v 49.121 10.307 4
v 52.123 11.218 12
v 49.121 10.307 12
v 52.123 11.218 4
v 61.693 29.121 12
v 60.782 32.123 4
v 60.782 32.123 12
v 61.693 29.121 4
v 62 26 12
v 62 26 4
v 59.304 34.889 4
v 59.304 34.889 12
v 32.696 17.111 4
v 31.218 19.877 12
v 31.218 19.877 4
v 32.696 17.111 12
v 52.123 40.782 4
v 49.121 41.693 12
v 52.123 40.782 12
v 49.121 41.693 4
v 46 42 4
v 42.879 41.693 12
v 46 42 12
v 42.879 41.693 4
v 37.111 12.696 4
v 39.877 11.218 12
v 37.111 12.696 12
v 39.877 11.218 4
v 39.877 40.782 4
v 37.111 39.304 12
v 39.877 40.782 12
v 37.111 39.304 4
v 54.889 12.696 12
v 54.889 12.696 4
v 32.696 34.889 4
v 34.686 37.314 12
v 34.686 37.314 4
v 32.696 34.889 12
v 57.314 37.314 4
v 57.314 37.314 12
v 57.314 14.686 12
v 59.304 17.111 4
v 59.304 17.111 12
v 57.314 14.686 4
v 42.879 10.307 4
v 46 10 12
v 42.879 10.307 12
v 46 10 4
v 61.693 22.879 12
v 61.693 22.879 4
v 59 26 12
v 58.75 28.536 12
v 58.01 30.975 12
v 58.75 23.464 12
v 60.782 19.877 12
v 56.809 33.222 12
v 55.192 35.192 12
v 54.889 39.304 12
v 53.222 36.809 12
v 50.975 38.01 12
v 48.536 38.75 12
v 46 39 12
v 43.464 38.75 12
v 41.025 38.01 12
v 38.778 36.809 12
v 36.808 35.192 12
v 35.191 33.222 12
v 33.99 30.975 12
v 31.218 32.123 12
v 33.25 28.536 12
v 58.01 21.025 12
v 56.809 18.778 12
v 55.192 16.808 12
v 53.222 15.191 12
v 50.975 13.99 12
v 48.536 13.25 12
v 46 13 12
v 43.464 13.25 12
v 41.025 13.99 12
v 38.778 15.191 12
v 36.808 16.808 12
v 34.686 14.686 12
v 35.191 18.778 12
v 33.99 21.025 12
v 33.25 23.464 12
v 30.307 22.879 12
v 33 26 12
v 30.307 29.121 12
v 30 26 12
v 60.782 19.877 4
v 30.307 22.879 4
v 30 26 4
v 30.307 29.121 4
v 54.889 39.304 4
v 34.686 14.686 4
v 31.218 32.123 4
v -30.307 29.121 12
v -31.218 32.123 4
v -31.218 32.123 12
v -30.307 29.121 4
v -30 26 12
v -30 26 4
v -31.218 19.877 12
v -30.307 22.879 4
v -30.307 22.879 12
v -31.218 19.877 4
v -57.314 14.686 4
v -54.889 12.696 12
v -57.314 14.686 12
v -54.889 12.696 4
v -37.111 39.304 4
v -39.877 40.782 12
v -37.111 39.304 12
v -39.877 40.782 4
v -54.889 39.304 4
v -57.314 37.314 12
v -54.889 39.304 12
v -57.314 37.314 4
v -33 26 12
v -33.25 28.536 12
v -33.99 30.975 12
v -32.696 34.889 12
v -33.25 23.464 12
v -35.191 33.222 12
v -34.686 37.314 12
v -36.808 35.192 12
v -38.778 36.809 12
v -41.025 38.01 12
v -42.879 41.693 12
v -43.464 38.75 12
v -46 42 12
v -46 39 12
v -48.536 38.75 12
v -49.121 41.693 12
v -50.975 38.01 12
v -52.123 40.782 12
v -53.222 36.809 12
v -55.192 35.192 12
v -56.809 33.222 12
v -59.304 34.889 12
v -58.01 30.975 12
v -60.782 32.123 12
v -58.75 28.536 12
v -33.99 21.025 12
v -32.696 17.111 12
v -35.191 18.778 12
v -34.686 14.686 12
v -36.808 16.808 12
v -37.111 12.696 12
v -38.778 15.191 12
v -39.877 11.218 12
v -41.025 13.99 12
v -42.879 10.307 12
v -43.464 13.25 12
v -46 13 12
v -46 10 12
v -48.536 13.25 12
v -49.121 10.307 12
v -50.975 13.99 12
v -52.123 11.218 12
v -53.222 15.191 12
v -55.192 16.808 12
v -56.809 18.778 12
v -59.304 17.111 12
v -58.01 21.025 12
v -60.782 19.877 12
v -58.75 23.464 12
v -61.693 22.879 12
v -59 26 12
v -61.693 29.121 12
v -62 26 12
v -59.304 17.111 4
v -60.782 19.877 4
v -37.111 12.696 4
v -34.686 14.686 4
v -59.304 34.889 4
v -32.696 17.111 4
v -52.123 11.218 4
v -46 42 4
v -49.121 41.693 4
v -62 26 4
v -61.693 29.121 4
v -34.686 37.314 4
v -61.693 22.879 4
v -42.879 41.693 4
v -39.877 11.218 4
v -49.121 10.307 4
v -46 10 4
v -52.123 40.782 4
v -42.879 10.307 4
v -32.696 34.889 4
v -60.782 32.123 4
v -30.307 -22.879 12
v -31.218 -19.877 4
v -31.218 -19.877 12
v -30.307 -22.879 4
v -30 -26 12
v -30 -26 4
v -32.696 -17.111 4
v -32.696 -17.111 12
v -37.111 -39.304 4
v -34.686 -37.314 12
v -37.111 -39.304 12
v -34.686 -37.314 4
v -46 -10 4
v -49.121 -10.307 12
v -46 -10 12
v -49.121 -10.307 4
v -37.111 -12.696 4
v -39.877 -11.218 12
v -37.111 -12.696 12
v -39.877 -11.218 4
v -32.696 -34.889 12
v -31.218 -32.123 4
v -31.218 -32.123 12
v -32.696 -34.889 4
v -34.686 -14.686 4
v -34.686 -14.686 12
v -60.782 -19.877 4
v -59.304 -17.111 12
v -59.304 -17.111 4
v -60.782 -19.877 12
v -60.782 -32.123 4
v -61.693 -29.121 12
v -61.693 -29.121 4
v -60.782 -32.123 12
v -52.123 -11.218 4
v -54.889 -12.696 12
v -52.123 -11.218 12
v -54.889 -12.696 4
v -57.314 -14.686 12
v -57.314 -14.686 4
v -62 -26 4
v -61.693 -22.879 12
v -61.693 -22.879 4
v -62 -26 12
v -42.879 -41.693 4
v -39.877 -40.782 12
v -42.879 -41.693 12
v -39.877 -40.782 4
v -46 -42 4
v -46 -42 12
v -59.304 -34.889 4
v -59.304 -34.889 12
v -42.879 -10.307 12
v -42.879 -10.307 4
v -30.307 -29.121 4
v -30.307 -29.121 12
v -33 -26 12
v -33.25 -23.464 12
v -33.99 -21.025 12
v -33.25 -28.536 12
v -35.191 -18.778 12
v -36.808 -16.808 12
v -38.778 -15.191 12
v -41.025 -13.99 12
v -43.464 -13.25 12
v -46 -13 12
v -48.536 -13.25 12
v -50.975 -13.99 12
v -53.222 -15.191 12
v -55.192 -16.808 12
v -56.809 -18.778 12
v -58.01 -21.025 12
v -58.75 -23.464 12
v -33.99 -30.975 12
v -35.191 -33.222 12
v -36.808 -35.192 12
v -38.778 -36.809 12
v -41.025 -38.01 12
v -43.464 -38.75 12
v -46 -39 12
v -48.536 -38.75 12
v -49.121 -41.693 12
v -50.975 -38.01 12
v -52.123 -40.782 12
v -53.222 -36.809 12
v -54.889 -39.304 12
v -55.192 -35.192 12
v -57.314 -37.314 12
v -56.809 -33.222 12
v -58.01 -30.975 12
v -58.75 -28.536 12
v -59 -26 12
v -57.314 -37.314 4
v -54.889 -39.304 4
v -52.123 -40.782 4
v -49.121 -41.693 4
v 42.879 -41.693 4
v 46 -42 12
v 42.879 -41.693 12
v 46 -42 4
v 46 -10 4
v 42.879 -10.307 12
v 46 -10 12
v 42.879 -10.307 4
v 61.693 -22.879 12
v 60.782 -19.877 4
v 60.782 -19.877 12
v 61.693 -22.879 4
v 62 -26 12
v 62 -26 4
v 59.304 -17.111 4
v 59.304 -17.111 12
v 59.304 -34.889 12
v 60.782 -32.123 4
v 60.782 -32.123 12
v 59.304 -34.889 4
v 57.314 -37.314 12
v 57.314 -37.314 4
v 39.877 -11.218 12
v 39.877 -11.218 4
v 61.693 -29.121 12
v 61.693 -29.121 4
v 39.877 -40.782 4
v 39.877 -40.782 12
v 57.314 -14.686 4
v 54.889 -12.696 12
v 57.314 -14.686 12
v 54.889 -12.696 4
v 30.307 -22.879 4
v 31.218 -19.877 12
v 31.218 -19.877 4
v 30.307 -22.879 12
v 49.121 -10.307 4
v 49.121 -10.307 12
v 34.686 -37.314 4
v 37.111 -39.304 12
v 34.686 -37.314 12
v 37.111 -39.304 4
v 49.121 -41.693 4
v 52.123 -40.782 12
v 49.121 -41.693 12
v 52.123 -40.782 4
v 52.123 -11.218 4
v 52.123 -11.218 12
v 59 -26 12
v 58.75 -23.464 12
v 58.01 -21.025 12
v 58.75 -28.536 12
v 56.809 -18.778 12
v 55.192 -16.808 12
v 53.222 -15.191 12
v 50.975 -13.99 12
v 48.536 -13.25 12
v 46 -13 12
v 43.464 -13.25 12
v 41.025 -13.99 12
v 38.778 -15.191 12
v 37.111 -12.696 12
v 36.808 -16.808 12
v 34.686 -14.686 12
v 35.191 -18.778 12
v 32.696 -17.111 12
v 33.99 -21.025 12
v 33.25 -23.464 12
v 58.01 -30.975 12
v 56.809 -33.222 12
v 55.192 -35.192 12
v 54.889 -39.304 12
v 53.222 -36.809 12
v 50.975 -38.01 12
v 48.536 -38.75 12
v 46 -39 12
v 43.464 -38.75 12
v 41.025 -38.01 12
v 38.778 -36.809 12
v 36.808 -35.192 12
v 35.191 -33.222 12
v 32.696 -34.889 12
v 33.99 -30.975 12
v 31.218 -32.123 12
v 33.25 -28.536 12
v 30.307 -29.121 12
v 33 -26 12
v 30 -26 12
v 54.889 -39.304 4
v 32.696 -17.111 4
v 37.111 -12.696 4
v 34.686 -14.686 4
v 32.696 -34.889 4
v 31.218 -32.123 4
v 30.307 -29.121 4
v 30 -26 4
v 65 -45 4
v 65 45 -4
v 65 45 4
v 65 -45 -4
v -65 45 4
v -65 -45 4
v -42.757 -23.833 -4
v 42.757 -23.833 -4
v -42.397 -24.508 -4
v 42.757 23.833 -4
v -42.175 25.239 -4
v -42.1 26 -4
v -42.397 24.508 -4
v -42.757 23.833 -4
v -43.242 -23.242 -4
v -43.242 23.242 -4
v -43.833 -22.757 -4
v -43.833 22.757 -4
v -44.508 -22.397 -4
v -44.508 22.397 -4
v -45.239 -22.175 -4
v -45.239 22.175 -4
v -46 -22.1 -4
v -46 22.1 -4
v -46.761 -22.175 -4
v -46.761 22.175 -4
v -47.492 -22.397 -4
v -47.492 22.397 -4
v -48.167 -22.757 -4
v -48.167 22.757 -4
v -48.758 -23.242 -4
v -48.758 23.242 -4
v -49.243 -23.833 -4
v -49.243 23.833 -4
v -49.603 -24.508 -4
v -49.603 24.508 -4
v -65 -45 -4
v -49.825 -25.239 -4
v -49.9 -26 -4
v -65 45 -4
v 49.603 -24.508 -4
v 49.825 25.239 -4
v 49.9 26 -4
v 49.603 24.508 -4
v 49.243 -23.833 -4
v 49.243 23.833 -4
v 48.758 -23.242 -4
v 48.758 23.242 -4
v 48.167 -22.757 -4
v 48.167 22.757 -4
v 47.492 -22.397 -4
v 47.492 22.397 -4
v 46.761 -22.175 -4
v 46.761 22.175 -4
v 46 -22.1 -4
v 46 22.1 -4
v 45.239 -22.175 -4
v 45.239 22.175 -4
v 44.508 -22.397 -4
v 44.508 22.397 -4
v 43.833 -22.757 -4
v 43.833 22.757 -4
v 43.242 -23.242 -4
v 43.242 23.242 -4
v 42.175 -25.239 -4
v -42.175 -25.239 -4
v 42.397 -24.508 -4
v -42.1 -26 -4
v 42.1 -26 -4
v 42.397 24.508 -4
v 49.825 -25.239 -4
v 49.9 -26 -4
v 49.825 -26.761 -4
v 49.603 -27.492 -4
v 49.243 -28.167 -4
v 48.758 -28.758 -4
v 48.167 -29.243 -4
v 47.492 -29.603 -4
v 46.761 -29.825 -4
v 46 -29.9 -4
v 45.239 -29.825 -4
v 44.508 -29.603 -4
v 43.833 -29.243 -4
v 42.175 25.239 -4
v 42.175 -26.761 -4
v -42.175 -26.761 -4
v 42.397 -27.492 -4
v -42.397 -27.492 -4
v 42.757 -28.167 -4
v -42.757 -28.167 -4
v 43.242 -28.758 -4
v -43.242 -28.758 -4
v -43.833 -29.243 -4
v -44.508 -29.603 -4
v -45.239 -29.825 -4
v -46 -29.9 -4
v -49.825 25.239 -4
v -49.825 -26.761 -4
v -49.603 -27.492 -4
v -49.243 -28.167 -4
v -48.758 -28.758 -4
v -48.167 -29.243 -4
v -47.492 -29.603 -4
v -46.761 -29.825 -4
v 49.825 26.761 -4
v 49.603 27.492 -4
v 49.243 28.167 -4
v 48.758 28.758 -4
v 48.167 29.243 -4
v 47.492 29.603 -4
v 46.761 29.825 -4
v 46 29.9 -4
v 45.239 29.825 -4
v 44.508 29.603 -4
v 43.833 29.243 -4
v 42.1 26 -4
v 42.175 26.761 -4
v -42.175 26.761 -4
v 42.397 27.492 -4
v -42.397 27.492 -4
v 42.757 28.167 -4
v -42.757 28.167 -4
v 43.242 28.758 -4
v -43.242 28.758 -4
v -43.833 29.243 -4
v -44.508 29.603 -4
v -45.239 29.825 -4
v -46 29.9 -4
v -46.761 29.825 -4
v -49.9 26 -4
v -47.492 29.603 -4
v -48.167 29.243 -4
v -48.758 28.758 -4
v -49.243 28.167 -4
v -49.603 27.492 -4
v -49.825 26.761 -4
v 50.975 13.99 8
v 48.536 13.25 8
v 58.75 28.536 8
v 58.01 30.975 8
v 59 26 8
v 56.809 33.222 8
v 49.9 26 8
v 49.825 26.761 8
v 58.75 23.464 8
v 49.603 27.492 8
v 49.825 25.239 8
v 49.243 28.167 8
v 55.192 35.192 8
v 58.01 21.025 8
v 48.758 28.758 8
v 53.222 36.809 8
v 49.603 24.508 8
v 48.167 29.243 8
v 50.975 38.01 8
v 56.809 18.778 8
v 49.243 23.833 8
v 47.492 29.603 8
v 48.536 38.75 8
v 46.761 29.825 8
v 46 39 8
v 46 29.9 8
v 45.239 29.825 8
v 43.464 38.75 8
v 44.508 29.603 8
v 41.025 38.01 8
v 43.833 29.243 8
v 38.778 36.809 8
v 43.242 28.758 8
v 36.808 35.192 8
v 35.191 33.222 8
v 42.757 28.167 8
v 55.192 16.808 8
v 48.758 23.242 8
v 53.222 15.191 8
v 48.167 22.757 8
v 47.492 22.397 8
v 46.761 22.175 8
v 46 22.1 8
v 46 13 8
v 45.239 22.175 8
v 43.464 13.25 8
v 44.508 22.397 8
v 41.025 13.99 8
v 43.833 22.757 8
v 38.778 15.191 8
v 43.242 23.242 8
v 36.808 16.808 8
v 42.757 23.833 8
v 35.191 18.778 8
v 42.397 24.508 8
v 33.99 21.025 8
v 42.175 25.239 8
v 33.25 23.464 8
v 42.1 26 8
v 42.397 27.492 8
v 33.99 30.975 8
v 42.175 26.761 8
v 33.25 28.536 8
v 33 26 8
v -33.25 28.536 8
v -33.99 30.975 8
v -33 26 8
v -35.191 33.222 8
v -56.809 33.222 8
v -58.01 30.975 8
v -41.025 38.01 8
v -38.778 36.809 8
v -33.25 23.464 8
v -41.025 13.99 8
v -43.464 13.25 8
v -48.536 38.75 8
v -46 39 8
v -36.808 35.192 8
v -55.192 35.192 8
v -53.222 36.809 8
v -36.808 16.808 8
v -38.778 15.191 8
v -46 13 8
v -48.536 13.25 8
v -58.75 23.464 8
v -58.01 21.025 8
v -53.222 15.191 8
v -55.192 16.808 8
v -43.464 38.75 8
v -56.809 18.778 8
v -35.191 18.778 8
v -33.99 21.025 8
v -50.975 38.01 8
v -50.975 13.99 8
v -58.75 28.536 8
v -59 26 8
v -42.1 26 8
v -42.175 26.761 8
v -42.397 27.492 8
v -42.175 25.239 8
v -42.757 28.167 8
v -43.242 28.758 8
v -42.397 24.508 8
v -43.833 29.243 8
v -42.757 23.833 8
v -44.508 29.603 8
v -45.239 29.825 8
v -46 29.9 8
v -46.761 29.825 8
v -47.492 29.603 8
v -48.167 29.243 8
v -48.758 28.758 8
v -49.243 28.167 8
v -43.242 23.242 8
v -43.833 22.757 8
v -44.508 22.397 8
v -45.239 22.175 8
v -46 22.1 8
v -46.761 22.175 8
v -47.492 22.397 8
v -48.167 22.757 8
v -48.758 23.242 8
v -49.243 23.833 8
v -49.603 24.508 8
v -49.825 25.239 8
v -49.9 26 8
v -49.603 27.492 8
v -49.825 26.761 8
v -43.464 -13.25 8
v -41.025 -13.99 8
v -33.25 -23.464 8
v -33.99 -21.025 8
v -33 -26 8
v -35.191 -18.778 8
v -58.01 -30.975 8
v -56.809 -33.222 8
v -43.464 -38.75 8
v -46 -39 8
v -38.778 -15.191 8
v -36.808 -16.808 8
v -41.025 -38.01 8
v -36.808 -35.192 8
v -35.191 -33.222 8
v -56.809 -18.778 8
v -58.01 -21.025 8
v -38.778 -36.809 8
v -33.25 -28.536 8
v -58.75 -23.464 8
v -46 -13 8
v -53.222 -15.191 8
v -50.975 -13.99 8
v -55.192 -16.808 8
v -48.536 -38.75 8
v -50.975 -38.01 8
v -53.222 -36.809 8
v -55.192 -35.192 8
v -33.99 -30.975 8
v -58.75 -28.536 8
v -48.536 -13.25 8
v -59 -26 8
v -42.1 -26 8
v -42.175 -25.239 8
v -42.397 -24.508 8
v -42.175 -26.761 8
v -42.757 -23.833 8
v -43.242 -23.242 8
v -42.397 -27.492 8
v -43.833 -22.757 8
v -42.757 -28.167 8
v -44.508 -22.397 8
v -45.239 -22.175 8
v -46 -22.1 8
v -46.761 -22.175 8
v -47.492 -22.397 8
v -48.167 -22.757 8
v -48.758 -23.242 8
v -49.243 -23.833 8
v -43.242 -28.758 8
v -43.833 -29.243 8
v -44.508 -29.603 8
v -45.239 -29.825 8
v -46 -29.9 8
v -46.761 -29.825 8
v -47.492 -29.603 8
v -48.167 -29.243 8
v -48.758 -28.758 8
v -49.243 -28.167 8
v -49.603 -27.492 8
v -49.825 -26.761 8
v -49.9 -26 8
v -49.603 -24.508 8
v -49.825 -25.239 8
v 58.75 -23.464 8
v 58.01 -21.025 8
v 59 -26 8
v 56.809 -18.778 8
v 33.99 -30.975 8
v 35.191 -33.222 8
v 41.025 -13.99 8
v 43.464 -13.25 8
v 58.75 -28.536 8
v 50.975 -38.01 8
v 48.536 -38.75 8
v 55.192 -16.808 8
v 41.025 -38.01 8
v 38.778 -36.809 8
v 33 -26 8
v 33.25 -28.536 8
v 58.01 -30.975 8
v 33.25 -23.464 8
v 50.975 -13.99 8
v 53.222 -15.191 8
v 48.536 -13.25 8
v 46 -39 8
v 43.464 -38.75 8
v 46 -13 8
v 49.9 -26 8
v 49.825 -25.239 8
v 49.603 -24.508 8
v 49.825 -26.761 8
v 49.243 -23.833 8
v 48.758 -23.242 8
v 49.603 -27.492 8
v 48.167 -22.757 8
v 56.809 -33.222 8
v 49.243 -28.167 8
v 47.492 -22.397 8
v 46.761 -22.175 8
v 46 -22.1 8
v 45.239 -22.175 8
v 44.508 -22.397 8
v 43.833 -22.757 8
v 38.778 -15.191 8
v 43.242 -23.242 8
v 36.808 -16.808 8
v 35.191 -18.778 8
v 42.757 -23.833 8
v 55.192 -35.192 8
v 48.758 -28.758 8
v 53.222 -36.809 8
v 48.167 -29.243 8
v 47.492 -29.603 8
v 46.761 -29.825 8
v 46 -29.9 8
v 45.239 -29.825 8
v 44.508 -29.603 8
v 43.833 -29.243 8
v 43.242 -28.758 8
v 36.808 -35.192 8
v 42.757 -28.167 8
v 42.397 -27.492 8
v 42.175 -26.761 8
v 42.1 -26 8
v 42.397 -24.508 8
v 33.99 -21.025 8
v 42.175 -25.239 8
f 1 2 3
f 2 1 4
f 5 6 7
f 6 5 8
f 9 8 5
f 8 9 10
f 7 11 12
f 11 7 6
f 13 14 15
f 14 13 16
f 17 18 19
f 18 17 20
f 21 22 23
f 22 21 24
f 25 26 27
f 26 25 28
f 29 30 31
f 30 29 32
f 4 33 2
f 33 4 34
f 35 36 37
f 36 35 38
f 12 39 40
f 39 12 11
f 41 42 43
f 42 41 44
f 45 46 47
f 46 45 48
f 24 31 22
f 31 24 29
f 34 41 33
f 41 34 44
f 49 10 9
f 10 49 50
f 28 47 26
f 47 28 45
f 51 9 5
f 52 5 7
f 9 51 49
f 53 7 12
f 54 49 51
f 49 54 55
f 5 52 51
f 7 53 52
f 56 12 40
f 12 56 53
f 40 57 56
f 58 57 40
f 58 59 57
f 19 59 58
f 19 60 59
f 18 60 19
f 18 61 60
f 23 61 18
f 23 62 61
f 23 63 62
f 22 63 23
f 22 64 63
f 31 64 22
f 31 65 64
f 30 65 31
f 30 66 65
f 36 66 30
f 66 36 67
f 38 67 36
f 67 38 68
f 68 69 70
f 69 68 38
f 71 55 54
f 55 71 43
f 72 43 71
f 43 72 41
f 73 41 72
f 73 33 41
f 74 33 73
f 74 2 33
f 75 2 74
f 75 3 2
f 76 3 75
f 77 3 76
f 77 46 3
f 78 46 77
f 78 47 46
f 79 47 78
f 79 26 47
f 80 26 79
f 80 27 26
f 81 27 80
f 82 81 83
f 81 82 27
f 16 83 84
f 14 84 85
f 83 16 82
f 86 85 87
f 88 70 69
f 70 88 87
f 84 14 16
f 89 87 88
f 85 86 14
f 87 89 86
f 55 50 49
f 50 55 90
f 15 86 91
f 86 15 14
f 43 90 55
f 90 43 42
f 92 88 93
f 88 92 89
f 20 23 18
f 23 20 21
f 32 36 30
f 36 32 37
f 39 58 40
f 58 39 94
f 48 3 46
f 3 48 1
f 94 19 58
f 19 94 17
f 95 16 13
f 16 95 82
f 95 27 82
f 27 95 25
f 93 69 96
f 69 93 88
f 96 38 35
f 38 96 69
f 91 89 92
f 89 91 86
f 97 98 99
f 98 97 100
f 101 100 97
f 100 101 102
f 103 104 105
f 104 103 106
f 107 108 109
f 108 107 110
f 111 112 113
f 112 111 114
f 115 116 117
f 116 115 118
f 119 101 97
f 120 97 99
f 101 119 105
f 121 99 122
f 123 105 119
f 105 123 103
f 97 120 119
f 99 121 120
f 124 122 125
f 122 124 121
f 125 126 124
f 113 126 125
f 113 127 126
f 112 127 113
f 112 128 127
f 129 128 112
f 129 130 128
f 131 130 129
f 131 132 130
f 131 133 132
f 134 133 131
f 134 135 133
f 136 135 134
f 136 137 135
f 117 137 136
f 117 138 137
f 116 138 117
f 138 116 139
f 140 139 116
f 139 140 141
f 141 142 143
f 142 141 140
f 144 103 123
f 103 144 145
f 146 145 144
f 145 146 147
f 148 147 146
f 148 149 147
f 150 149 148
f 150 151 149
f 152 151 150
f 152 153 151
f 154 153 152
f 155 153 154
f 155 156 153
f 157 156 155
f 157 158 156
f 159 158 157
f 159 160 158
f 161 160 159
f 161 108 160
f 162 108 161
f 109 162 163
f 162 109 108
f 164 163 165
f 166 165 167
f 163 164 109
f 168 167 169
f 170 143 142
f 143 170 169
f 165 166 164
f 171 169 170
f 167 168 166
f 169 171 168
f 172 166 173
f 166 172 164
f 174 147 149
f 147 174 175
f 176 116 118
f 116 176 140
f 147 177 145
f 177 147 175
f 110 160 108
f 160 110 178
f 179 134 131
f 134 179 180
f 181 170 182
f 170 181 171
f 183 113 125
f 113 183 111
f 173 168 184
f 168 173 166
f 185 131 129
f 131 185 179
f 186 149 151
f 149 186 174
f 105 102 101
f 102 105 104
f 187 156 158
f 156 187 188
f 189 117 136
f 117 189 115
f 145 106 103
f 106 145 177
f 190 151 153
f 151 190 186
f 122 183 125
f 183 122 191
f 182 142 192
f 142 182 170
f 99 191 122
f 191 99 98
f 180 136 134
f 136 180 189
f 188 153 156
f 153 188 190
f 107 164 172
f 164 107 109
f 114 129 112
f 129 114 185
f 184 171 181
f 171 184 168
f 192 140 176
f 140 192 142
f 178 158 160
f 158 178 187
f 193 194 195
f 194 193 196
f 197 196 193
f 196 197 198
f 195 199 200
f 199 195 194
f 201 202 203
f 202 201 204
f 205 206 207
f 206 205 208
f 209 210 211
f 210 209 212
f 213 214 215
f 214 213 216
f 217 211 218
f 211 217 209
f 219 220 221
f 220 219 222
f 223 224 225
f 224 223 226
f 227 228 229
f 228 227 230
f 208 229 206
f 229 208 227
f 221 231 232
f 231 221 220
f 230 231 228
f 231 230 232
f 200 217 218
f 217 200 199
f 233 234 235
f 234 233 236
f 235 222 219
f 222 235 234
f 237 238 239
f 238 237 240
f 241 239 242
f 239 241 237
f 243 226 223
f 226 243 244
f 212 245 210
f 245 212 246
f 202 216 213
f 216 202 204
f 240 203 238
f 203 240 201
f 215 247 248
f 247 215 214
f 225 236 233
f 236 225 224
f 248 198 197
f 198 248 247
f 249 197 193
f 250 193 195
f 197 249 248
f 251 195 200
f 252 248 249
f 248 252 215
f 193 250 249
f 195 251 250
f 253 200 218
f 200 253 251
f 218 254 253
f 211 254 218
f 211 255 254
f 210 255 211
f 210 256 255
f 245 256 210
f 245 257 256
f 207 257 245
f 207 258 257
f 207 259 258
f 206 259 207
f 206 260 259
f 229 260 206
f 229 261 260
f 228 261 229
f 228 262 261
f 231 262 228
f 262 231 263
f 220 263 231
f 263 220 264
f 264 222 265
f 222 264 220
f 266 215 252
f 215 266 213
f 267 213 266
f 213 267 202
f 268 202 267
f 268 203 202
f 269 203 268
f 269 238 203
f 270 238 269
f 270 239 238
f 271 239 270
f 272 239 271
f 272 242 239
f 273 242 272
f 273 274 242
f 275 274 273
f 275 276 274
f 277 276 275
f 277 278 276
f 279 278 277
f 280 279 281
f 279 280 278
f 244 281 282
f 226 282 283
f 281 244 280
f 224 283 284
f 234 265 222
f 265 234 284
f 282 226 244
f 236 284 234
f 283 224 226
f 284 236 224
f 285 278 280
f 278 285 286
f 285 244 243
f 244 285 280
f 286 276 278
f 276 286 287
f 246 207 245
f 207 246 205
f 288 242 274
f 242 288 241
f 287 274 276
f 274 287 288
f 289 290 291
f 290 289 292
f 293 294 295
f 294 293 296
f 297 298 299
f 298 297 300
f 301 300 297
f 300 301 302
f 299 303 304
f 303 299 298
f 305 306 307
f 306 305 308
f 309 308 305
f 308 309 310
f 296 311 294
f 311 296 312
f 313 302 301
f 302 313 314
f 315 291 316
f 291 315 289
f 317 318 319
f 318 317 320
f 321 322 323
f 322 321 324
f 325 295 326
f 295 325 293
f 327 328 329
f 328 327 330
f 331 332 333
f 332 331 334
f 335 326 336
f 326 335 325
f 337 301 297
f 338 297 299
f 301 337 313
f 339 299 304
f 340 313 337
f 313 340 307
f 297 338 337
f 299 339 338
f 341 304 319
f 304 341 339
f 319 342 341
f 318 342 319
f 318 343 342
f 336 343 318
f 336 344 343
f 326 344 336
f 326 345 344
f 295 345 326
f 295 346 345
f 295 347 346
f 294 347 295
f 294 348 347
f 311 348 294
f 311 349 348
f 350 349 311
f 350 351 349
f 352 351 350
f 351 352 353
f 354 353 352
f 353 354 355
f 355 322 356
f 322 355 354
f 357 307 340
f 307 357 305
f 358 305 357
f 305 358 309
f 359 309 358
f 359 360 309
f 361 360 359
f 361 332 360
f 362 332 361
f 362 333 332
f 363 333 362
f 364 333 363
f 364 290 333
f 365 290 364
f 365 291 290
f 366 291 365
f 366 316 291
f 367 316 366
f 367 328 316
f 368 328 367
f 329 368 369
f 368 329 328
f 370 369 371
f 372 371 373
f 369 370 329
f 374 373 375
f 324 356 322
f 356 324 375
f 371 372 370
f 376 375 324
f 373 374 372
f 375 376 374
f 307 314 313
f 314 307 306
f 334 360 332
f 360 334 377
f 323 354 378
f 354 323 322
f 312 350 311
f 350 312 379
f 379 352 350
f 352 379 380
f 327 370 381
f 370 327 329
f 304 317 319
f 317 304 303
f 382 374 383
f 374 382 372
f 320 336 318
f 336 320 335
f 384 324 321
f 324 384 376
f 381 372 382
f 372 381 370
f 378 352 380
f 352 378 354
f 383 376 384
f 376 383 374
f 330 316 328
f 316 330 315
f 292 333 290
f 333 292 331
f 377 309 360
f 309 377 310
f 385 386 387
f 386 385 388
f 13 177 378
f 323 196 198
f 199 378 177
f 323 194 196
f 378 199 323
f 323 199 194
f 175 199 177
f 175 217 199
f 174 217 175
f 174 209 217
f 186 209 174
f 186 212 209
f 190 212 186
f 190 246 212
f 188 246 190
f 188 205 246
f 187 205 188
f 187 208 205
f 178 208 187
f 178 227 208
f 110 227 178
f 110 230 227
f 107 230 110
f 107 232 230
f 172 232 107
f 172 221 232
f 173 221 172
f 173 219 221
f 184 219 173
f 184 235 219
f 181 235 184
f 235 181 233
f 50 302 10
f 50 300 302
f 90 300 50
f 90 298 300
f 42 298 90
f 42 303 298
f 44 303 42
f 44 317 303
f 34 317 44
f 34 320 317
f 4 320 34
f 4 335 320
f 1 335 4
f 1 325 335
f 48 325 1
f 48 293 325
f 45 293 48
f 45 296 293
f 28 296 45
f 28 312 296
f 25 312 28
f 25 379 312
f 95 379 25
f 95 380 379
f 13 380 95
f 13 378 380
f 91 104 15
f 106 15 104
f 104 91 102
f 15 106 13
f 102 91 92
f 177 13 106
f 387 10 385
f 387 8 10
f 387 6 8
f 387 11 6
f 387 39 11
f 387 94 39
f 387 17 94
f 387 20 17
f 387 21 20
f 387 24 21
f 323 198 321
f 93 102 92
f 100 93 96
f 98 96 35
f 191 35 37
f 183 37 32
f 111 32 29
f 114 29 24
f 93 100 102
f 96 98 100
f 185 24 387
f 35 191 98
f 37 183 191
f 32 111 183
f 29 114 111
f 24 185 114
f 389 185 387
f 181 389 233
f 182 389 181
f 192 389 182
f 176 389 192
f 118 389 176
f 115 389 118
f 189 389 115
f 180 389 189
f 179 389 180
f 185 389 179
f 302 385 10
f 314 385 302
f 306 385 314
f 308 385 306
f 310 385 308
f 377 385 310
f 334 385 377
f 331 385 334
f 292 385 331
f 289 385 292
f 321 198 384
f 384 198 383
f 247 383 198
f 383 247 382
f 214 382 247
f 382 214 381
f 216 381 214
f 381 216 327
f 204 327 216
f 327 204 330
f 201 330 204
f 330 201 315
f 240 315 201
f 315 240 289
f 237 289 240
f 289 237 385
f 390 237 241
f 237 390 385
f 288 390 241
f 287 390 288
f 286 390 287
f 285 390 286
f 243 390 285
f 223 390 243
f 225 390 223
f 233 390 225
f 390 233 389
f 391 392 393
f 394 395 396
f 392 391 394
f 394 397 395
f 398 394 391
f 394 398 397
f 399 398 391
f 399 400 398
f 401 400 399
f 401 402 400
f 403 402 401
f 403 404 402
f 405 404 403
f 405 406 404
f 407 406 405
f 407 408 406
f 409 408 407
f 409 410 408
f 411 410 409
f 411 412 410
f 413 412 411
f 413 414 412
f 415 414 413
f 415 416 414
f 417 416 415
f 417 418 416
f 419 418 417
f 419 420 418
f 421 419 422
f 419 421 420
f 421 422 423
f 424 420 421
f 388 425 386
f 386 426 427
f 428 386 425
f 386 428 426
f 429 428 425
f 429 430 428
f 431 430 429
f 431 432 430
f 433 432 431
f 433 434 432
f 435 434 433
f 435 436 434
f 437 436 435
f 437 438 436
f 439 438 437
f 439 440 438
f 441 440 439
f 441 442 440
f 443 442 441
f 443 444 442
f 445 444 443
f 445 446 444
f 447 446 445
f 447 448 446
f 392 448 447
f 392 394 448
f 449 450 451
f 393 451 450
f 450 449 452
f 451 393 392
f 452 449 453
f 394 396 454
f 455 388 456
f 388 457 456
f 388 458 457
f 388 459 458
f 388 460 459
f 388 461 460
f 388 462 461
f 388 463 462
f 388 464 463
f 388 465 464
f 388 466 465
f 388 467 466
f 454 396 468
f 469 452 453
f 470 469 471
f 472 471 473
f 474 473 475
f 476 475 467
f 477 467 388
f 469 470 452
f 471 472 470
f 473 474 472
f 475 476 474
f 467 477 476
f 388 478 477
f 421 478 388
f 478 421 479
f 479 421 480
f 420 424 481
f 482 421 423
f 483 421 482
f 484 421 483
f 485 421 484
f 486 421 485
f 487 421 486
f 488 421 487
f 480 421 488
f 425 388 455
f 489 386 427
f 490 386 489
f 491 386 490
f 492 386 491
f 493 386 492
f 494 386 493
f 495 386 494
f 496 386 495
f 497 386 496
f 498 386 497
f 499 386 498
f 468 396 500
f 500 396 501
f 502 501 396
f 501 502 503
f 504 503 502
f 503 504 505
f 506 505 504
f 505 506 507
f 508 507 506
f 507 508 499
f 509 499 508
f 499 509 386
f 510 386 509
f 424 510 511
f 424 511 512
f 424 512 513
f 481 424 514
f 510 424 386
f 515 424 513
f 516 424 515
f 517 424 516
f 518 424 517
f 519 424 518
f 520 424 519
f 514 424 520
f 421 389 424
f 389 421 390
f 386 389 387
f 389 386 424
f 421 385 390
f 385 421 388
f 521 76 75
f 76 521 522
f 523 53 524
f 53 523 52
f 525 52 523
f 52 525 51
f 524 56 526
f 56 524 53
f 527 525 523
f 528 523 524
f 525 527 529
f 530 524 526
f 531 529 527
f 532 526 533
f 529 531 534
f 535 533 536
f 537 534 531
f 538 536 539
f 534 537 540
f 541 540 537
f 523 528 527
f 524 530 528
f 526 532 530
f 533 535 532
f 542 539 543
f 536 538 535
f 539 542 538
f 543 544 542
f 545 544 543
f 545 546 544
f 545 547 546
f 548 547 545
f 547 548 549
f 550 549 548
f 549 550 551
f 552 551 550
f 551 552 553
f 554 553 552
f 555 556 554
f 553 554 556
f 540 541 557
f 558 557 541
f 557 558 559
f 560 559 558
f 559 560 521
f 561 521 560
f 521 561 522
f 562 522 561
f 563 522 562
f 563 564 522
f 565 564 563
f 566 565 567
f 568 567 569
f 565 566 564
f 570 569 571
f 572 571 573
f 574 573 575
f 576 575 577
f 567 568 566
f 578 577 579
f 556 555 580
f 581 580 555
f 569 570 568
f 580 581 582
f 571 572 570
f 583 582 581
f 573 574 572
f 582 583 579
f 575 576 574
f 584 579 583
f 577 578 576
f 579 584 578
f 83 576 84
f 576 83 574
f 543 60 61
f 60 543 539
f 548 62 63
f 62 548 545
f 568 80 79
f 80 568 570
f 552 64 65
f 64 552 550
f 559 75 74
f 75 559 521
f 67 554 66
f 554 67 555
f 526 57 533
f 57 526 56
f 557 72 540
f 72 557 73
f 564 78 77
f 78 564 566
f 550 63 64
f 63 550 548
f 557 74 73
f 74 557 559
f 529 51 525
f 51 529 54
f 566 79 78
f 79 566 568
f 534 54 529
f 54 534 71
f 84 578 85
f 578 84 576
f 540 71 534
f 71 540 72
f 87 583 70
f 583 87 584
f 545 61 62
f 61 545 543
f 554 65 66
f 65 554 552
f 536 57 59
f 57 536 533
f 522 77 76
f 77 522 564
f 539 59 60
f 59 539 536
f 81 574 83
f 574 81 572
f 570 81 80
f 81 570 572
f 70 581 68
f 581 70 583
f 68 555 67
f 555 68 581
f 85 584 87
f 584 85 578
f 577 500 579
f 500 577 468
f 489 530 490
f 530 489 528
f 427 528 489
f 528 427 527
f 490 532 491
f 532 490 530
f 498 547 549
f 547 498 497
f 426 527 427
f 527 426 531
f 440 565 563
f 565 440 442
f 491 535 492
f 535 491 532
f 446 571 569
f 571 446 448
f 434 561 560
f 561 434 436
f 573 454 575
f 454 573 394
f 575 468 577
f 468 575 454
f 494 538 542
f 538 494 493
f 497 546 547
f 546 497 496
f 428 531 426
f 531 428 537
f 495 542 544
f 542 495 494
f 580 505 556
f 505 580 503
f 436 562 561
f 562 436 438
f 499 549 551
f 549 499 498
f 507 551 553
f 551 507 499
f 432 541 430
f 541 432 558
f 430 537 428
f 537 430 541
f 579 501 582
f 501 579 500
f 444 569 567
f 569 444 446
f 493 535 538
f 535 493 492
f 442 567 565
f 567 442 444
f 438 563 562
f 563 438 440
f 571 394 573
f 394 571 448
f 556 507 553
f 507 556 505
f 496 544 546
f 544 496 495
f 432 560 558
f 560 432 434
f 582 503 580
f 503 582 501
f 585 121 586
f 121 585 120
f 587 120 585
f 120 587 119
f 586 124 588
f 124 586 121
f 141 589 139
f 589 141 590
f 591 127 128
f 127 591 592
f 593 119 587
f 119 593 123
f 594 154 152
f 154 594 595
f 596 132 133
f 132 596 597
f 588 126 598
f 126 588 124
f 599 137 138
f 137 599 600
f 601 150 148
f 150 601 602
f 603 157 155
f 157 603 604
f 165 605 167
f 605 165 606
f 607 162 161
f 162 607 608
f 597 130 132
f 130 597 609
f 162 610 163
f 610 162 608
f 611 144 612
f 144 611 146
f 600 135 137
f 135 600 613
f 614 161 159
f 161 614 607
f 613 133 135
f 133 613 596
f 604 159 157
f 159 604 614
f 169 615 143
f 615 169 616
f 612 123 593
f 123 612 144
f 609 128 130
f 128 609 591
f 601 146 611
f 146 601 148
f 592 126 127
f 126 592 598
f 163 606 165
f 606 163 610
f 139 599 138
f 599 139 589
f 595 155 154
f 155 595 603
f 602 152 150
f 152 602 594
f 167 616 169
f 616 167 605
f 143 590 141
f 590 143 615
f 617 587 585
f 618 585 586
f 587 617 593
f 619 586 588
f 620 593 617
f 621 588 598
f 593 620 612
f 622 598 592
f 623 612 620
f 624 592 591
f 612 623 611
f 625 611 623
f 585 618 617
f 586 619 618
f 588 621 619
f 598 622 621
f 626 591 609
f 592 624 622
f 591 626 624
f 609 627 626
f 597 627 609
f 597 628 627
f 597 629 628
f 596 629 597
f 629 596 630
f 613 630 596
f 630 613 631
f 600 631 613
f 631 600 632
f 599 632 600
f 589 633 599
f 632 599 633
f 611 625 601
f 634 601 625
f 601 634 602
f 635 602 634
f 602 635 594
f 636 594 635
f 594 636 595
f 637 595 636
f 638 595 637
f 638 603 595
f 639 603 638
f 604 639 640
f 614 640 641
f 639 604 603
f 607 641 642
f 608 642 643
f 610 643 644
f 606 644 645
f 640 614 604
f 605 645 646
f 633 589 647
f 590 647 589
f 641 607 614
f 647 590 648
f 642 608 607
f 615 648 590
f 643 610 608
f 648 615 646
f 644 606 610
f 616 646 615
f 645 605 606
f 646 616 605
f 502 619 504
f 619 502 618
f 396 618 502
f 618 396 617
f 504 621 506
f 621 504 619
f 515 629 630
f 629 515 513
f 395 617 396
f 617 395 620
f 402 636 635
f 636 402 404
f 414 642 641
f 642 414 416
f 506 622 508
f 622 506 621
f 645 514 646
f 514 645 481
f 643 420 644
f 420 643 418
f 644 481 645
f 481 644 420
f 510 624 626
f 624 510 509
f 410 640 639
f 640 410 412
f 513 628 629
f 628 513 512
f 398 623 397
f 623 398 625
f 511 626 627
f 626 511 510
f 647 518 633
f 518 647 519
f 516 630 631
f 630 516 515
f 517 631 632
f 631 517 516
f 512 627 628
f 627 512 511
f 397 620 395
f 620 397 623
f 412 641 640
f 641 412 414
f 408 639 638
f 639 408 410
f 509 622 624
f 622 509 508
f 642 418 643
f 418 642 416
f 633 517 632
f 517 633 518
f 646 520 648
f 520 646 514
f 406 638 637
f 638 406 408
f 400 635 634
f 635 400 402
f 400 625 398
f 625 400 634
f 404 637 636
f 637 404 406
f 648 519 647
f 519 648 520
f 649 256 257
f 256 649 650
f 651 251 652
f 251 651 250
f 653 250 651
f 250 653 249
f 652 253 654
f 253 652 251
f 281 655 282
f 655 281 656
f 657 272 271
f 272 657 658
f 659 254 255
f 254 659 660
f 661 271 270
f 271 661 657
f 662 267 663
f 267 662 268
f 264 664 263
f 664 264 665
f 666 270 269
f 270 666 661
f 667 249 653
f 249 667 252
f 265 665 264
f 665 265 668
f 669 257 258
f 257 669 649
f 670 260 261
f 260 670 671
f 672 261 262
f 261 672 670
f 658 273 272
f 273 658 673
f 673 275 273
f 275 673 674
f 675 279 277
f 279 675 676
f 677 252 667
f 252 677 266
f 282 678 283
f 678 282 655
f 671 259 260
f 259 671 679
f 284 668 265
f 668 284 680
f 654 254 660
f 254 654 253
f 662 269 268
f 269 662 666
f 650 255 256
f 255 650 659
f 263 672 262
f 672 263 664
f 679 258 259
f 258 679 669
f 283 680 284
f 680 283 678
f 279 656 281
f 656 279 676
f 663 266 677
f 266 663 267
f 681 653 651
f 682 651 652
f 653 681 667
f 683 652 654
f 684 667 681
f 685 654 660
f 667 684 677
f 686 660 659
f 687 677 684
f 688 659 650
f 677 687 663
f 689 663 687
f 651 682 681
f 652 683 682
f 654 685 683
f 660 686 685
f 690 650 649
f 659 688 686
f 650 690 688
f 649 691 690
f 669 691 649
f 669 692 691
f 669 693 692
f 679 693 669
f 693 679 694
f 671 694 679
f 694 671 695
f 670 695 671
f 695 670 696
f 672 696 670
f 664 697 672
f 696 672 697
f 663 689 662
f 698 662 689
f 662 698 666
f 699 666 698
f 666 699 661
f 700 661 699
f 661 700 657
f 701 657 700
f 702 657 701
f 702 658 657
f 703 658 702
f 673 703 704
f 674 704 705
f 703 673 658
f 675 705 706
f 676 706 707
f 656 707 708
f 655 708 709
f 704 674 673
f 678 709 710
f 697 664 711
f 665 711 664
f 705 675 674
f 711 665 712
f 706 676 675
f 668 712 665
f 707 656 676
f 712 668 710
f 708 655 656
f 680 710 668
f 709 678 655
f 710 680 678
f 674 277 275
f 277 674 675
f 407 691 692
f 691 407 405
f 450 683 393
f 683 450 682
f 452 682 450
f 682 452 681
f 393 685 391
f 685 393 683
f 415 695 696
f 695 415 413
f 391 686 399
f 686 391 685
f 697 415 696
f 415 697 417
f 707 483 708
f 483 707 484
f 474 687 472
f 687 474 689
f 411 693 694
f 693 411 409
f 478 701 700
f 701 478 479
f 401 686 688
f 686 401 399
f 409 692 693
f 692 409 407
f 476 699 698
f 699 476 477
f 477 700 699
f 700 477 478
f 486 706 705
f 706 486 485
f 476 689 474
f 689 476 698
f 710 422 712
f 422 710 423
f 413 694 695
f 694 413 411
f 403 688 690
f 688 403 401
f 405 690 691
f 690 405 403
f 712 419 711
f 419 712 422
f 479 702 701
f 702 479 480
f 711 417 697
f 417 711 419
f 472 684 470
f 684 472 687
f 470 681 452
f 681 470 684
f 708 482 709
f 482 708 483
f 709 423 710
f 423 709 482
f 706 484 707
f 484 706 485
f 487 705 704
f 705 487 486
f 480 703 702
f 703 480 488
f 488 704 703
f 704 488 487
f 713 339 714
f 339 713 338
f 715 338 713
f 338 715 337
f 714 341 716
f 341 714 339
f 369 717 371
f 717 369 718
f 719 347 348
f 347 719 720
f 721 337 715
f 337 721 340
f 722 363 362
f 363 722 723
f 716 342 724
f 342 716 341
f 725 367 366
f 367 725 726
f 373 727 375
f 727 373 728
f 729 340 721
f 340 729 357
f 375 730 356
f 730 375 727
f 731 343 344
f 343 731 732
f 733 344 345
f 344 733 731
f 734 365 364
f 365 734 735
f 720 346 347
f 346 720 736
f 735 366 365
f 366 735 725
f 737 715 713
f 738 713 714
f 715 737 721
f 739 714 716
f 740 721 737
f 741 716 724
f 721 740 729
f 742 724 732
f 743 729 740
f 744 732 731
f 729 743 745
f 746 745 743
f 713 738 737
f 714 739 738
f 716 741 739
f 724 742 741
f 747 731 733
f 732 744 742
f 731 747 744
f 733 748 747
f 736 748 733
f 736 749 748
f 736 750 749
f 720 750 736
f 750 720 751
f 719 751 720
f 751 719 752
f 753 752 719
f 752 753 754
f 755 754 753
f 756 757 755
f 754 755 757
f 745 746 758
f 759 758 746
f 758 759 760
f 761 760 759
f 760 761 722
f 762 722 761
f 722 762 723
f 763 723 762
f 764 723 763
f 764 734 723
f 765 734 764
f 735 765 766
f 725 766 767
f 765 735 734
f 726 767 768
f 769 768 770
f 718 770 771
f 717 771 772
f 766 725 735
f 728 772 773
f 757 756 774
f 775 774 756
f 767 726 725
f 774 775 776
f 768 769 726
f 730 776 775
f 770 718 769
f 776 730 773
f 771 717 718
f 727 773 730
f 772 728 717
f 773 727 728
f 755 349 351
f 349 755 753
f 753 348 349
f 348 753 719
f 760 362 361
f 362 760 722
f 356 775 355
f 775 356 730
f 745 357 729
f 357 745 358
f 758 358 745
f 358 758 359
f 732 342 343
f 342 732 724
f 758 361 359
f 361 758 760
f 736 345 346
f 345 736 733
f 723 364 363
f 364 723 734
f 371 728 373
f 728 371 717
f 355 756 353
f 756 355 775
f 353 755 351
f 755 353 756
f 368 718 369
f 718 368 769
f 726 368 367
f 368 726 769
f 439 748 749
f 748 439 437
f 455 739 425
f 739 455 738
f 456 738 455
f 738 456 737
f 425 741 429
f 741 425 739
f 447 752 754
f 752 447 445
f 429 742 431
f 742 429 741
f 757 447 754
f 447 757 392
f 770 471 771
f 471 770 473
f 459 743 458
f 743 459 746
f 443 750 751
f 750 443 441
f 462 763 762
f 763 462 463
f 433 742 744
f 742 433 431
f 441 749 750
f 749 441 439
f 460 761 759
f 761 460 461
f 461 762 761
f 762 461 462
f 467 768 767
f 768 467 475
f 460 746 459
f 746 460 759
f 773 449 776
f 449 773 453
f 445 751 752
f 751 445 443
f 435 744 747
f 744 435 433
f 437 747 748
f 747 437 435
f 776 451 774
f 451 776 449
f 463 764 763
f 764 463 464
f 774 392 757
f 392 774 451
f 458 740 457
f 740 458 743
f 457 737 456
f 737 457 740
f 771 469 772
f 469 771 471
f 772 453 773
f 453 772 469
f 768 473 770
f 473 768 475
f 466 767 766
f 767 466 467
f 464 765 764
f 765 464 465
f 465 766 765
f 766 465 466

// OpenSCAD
$fn = 32;

// ----------------------------------------------------------------------
// Socket pad plate
// bosses with counterbored sockets for the screws
// ----------------------------------------------------------------------

// --- parameters (mm) ---
base_t = 8;            // base plate thickness
boss_h = 8;            // boss height above the base plate
boss_d = 32;           // boss diameter
socket_d = 26;         // socket diameter
socket_depth = 4;      // socket depth from the boss face
bolt_d = 7.8;          // screw clearance hole through the socket floor
plate = [130, 90, 8];  // overall size (x, y, z)
edge = 19;             // boss centre offset from the plate edge
pads = 4;              // boss count, one per corner

// --- derived feature positions (mm) ---
height = base_t + boss_h;        // = 16   overall height of the part
corner_x = plate[0] / 2 - edge;  // = 46   boss centre X
corner_y = plate[1] / 2 - edge;  // = 26   boss centre Y
feature_centers = [
  [corner_x, corner_y],
  [-corner_x, corner_y],
  [-corner_x, -corner_y],
  [corner_x, -corner_y]
];   // boss centres: sockets, holes and the pads themselves are placed from here

// base plate, bosses on feature_centers, socket + through hole in each
difference() {
  union() {
    cube(plate, center = true);
    for (centre = feature_centers)
      translate([centre[0], centre[1], plate[2] / 2 - 1])
        cylinder(d = boss_d, h = boss_h + 1);
  }
  for (centre = feature_centers) {
    translate([centre[0], centre[1], plate[2] / 2 + boss_h - socket_depth])
      cylinder(d = socket_d, h = socket_depth + 1);
    translate([centre[0], centre[1], -height])
      cylinder(d = bolt_d, h = 2 * height + 2);  // through the socket floor
  }
}
